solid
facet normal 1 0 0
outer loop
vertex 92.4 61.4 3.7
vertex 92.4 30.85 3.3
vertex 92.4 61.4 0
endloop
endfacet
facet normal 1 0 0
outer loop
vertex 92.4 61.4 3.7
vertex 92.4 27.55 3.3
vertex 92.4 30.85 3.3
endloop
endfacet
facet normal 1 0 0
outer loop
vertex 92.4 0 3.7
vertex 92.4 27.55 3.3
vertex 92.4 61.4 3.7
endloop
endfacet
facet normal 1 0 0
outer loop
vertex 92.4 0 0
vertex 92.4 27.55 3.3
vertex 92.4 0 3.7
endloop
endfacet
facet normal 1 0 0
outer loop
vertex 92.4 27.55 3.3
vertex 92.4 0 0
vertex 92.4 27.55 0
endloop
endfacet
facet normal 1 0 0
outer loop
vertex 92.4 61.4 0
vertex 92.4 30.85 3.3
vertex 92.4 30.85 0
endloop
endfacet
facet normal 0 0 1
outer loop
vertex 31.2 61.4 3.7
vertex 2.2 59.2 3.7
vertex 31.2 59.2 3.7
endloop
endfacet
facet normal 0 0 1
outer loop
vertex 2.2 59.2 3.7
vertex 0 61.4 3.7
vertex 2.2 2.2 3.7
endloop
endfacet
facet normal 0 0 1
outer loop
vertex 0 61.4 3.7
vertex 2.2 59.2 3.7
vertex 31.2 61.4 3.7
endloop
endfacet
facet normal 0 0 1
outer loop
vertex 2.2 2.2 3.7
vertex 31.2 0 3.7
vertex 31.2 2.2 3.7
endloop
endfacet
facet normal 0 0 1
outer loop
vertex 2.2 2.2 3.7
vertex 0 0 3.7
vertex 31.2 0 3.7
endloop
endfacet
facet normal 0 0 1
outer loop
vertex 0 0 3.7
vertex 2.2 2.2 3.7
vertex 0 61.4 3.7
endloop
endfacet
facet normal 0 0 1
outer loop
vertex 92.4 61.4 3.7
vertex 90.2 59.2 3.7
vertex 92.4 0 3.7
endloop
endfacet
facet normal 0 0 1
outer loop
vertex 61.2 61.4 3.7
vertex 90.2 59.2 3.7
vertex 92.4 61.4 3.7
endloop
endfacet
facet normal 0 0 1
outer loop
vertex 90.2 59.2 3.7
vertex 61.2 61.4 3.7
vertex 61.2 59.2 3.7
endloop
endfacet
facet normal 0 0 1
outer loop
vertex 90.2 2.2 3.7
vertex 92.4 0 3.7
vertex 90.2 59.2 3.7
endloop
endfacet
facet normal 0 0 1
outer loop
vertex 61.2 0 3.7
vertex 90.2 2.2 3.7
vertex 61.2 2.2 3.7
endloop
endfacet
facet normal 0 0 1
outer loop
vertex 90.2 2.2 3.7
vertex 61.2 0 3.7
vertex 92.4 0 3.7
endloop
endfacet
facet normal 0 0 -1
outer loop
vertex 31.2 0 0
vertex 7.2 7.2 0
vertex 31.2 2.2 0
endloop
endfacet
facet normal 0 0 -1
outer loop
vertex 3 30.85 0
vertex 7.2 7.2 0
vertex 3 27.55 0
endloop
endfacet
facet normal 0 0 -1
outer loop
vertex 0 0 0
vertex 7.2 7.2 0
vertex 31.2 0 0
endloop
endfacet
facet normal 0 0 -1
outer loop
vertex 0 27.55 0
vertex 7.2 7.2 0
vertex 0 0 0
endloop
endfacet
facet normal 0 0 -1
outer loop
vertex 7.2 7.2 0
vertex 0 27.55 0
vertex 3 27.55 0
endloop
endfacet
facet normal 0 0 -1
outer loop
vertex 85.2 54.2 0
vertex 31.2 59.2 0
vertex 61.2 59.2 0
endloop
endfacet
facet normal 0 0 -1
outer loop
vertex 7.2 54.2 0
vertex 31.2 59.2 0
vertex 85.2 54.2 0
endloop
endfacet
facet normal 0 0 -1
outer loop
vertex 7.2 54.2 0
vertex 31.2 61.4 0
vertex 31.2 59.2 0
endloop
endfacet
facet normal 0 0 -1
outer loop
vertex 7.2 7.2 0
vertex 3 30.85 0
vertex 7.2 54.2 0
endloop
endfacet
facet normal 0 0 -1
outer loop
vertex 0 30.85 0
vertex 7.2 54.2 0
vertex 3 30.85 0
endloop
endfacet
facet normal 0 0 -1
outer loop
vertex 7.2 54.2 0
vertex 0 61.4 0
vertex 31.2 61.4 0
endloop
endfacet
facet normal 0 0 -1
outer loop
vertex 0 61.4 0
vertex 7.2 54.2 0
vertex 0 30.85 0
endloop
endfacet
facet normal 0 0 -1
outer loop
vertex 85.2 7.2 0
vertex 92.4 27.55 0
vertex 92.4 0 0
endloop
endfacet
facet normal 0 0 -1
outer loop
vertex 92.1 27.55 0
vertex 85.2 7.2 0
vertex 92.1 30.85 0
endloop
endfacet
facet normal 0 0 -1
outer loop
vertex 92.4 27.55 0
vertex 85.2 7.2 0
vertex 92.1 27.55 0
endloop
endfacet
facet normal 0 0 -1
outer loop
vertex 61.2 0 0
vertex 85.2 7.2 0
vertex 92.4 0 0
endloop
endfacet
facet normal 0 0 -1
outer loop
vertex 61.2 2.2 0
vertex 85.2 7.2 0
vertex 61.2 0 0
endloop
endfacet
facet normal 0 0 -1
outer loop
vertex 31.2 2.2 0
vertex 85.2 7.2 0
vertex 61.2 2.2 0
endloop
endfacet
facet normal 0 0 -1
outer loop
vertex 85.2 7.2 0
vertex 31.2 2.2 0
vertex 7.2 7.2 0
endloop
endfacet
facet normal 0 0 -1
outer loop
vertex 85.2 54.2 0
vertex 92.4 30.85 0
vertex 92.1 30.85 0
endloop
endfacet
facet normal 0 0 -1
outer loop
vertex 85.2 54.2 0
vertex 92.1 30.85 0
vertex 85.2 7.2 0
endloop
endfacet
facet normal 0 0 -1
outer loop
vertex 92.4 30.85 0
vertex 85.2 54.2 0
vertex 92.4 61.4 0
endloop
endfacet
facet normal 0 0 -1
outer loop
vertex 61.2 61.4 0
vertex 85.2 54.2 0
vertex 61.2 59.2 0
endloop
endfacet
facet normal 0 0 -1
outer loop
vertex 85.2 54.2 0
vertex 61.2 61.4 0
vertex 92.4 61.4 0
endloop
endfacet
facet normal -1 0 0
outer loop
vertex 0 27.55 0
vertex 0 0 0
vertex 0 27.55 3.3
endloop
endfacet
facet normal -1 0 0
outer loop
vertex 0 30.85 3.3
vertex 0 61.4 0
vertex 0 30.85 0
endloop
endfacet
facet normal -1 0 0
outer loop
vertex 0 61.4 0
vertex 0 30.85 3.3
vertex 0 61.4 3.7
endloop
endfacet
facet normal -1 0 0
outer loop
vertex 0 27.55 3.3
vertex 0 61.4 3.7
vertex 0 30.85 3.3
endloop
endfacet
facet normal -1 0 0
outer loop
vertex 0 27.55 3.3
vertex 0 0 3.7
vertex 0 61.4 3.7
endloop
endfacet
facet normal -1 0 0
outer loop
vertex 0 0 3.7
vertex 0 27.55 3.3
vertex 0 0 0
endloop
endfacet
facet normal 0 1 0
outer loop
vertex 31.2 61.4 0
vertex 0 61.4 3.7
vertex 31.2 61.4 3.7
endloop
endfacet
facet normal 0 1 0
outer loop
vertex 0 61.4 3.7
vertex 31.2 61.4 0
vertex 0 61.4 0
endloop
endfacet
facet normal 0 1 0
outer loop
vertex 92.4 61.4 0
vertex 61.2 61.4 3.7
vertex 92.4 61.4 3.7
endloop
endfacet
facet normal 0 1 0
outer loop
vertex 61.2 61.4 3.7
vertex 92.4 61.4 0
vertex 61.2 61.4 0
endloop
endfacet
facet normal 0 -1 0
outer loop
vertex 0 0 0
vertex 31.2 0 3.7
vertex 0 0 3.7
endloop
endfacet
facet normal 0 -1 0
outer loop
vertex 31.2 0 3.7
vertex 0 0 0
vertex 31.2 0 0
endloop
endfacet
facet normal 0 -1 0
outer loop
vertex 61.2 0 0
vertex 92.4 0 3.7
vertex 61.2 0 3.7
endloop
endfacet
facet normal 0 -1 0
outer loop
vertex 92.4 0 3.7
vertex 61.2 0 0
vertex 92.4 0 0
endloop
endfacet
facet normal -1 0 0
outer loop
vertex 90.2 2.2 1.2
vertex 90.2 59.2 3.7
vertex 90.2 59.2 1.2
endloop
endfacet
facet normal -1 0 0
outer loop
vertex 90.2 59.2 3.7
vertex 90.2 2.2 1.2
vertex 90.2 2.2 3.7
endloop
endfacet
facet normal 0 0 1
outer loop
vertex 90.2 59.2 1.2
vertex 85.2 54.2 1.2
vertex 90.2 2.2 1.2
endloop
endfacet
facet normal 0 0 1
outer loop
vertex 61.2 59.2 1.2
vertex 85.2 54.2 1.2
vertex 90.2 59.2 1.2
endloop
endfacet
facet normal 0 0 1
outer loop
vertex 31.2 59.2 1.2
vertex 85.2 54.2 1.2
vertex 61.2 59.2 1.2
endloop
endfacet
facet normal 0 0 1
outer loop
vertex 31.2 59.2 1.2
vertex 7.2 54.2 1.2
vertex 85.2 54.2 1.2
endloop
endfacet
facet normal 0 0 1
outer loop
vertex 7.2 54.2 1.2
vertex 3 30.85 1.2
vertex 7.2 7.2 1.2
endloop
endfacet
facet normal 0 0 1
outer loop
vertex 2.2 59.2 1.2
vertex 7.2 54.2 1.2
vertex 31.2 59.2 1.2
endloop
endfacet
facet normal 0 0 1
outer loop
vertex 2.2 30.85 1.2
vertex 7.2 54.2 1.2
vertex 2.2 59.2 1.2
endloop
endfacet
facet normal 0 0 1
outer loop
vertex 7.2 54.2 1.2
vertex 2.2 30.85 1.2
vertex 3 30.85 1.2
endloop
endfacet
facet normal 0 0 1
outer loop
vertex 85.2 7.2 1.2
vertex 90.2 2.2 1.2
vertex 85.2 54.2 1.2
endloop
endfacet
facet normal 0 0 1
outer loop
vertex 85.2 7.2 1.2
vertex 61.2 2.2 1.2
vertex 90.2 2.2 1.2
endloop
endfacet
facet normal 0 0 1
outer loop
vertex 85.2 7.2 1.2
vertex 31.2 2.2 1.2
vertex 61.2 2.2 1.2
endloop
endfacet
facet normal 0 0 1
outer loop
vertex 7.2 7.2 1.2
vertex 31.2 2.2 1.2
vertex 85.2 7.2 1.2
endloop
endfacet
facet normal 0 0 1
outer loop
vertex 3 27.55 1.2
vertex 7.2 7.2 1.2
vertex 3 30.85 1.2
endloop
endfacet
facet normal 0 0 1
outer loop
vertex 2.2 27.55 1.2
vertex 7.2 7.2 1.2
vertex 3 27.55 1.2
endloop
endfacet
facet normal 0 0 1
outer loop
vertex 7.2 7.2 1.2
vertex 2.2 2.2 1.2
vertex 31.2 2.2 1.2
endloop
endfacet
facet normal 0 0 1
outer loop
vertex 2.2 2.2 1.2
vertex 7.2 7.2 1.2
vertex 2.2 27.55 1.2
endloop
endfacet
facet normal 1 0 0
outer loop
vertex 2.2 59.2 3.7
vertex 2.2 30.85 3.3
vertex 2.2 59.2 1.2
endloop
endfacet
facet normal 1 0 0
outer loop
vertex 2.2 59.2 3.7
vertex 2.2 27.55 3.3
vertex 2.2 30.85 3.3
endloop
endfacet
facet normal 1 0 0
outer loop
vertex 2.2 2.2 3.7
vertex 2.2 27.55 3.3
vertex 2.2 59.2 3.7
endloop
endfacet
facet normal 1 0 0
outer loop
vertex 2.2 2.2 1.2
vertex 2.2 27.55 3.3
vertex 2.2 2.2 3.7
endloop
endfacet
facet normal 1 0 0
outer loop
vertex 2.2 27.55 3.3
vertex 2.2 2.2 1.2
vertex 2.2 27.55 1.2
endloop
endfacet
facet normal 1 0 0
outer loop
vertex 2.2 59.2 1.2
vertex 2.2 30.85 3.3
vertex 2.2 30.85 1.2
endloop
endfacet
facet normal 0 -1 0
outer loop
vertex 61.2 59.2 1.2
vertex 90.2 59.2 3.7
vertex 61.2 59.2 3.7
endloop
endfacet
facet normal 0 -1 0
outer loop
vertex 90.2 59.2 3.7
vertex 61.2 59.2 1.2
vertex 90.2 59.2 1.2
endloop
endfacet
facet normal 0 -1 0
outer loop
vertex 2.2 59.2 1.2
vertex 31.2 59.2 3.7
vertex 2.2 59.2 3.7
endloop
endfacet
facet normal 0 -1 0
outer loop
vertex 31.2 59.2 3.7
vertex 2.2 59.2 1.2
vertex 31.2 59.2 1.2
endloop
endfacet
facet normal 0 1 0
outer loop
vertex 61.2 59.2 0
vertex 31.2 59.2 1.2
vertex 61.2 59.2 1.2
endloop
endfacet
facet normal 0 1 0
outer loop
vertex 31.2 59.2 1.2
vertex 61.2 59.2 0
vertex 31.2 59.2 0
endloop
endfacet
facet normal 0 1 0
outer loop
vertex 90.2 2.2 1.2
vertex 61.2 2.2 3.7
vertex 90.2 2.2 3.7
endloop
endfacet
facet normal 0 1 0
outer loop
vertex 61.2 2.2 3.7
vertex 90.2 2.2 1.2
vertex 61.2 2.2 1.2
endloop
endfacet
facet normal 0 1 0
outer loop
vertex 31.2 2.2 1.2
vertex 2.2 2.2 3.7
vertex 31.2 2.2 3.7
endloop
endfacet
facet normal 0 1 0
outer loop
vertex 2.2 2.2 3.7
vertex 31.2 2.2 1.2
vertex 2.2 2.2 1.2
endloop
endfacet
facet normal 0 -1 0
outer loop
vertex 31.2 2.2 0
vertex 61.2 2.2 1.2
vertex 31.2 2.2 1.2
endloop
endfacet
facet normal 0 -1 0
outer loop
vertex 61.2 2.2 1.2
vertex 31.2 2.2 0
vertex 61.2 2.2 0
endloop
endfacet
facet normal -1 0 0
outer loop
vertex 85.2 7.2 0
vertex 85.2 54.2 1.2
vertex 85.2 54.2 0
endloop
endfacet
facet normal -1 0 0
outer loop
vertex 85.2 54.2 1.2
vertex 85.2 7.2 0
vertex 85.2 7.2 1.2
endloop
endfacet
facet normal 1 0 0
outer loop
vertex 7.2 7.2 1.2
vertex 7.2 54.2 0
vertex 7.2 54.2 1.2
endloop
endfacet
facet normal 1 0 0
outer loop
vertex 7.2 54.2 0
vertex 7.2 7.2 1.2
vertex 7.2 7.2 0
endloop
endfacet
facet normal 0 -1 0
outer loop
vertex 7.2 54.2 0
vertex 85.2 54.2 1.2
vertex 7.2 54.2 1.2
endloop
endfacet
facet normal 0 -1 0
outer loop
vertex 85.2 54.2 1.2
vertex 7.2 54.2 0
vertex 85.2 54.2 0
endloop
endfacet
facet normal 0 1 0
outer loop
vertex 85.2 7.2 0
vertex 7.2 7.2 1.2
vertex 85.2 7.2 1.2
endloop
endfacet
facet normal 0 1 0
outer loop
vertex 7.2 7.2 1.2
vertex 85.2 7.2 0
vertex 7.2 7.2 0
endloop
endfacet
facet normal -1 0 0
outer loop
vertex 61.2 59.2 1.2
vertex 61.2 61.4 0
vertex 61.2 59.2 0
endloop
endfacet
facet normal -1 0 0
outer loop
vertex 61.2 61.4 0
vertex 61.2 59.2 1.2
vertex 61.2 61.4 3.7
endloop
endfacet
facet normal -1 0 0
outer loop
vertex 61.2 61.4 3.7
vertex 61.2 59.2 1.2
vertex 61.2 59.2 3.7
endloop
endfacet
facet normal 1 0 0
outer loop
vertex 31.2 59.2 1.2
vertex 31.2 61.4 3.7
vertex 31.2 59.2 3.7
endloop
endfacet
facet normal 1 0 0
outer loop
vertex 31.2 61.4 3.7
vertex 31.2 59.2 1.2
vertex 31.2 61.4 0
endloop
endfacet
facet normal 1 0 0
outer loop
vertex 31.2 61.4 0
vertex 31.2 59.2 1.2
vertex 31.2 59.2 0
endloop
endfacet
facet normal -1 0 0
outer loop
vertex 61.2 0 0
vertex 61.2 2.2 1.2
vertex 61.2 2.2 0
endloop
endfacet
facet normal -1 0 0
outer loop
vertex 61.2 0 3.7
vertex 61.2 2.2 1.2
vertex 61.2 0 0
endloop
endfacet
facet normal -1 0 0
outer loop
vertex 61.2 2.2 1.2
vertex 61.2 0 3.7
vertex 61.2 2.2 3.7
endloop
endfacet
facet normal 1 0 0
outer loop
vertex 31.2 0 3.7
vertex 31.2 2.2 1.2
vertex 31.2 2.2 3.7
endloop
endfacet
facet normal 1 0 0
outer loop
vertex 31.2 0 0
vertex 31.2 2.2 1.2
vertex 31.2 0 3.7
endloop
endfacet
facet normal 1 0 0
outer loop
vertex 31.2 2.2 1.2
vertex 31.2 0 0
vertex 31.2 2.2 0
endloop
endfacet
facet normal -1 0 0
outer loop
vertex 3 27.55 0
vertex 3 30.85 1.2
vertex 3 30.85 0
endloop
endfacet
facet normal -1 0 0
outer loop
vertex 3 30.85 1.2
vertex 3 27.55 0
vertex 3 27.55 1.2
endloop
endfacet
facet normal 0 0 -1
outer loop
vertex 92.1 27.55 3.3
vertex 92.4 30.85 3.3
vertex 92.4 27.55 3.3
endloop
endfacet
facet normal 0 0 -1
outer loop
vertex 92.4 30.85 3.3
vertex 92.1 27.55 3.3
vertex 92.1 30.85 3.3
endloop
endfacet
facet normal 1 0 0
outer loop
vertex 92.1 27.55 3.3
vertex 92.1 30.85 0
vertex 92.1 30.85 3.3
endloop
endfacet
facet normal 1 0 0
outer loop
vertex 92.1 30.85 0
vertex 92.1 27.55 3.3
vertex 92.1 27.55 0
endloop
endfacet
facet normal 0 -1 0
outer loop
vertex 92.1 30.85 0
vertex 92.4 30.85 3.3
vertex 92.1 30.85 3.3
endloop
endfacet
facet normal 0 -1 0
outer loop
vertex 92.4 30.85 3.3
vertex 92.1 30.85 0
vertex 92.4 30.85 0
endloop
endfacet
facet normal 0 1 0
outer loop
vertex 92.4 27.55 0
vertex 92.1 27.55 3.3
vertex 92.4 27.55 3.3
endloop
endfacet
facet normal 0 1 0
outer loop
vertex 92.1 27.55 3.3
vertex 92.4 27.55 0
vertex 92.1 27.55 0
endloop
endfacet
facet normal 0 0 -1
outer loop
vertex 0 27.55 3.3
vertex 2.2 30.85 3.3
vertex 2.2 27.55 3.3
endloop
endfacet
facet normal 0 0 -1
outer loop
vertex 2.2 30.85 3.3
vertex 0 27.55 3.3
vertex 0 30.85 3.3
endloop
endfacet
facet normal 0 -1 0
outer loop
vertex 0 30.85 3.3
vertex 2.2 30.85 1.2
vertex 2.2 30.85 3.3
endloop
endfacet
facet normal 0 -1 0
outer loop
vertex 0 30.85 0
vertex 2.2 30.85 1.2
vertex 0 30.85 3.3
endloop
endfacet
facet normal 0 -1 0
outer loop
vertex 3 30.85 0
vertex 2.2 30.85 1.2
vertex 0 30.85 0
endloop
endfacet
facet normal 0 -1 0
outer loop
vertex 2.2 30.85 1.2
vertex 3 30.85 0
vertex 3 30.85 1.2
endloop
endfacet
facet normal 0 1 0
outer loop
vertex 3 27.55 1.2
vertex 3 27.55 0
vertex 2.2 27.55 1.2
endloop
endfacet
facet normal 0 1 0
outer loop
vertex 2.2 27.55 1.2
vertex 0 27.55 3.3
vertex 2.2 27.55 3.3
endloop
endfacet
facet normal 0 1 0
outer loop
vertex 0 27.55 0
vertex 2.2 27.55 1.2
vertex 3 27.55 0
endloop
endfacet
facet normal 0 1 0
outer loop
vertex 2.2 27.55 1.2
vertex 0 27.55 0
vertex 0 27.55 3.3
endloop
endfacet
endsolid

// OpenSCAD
// Saboteur Card Grid - Single Horizontal Card Holder with Center Cutout and Repositioned Connectors
// For cards of size 56mm × 87mm (positioned horizontally)

/* Parameters */
// Card dimensions (horizontal orientation)
card_width = 87;  // Card width when placed horizontally
card_height = 56; // Card height when placed horizontally

// Tile parameters
card_clearance = 0.5; // Clearance for easy card removal
wall_thickness = 2.2; // Thickness of walls
base_height = 1.2;    // Height of the base
wall_height = 2.5;    // Height of walls above the base
border_width = 5;     // Width of the border that supports the card

// Connector parameters
connector_height = 3;
connector_width = 6;
connector_depth = 3;
connector_tolerance = 0.3;
// Additional vertical offset for top and bottom connectors to keep card access clear
connector_gap = 2;

// Total dimensions of a single tile
total_width = card_width + 2 * card_clearance;
total_height = card_height + 2 * card_clearance;
total_depth = base_height + wall_height;

// Module for a single card holder with center cutout
module card_frame() {
    difference() {
        // Outer frame
        cube([total_width + 2*wall_thickness, 
              total_height + 2*wall_thickness, 
              total_depth]);
        
        // Inner cutout for card - only cutting down from the top, leaving a lip
        translate([wall_thickness, wall_thickness, base_height]) {
            cube([total_width, total_height, wall_height + 1]);
        }
        
        // Center cutout to save material
        translate([wall_thickness + border_width, 
                   wall_thickness + border_width, 
                   0]) {
            cube([total_width - 2*border_width, 
                  total_height - 2*border_width, 
                  total_depth]);
        }
        
        // Cutout for card access/removal at the bottom edge
        translate([wall_thickness + total_width/2 - 15, wall_thickness + total_height, 0]) {
            cube([30, wall_thickness, total_depth + 1]);
        }
        
        // Cutout for card access/removal at the top edge
        translate([wall_thickness + total_width/2 - 15, 0, 0]) {
            cube([30, wall_thickness, total_depth + 1]);
        }
    }
}

// Module for a male connector tab (protruding)
module male_connector() {
    cube([connector_width, connector_depth, connector_height]);
}

// Module for a female connector socket (recessed)
module female_connector() {
    cube([connector_width + connector_tolerance, 
          connector_depth + connector_tolerance, 
          connector_height + connector_tolerance]);
}

// Module for a complete single tile with connectors on all sides.
// The top and bottom connectors are shifted vertically by connector_gap to clear the card access cutouts.
module tile() {
    difference() {
        union() {
            // Base card frame
            card_frame();
            
            // Male connectors on all four sides
            // Right center (unchanged)
            translate([total_width + 2*wall_thickness, 
                      wall_thickness + total_height/2 - connector_width/2, 
                      0])
                male_connector();
            
            // Bottom center - shifted further down by connector_gap
            translate([wall_thickness + total_width/2 - connector_width/2,
                      total_height + 2*wall_thickness + connector_gap, 
                      0])
                male_connector();
                
            // Left center (unchanged)
            translate([-connector_depth,
                      wall_thickness + total_height/2 - connector_width/2, 
                      0])
                male_connector();
                
            // Top center - shifted further up (negative Y) by connector_gap
            translate([wall_thickness + total_width/2 - connector_width/2,
                      -connector_depth - connector_gap, 
                      0])
                male_connector();
        }
        
        // Female connectors on all four sides, with matching adjustments for top and bottom.
        // Right center
        translate([total_width + 2*wall_thickness - connector_tolerance,
                  wall_thickness + total_height/2 - connector_width/2 - connector_tolerance/2, 
                  0])
            female_connector();
        
        // Bottom center
        translate([wall_thickness + total_width/2 - connector_width/2 - connector_tolerance/2,
                  total_height + 2*wall_thickness + connector_gap - connector_tolerance, 
                  0])
            female_connector();
            
        // Left center
        translate([-connector_depth - connector_tolerance,
                  wall_thickness + total_height/2 - connector_width/2 - connector_tolerance/2, 
                  0])
            female_connector();
            
        // Top center
        translate([wall_thickness + total_width/2 - connector_width/2 - connector_tolerance/2,
                  -connector_depth - connector_gap - connector_tolerance, 
                  0])
            female_connector();
    }
}

// Render a single tile
tile();

// Dimensions of a single tile (for reference)
echo("Single tile dimensions:");
echo(str("Width: ", total_width + 2*wall_thickness, " mm"));
echo(str("Height: ", total_height + 2*wall_thickness, " mm"));
echo(str("Depth: ", total_depth, " mm"));
